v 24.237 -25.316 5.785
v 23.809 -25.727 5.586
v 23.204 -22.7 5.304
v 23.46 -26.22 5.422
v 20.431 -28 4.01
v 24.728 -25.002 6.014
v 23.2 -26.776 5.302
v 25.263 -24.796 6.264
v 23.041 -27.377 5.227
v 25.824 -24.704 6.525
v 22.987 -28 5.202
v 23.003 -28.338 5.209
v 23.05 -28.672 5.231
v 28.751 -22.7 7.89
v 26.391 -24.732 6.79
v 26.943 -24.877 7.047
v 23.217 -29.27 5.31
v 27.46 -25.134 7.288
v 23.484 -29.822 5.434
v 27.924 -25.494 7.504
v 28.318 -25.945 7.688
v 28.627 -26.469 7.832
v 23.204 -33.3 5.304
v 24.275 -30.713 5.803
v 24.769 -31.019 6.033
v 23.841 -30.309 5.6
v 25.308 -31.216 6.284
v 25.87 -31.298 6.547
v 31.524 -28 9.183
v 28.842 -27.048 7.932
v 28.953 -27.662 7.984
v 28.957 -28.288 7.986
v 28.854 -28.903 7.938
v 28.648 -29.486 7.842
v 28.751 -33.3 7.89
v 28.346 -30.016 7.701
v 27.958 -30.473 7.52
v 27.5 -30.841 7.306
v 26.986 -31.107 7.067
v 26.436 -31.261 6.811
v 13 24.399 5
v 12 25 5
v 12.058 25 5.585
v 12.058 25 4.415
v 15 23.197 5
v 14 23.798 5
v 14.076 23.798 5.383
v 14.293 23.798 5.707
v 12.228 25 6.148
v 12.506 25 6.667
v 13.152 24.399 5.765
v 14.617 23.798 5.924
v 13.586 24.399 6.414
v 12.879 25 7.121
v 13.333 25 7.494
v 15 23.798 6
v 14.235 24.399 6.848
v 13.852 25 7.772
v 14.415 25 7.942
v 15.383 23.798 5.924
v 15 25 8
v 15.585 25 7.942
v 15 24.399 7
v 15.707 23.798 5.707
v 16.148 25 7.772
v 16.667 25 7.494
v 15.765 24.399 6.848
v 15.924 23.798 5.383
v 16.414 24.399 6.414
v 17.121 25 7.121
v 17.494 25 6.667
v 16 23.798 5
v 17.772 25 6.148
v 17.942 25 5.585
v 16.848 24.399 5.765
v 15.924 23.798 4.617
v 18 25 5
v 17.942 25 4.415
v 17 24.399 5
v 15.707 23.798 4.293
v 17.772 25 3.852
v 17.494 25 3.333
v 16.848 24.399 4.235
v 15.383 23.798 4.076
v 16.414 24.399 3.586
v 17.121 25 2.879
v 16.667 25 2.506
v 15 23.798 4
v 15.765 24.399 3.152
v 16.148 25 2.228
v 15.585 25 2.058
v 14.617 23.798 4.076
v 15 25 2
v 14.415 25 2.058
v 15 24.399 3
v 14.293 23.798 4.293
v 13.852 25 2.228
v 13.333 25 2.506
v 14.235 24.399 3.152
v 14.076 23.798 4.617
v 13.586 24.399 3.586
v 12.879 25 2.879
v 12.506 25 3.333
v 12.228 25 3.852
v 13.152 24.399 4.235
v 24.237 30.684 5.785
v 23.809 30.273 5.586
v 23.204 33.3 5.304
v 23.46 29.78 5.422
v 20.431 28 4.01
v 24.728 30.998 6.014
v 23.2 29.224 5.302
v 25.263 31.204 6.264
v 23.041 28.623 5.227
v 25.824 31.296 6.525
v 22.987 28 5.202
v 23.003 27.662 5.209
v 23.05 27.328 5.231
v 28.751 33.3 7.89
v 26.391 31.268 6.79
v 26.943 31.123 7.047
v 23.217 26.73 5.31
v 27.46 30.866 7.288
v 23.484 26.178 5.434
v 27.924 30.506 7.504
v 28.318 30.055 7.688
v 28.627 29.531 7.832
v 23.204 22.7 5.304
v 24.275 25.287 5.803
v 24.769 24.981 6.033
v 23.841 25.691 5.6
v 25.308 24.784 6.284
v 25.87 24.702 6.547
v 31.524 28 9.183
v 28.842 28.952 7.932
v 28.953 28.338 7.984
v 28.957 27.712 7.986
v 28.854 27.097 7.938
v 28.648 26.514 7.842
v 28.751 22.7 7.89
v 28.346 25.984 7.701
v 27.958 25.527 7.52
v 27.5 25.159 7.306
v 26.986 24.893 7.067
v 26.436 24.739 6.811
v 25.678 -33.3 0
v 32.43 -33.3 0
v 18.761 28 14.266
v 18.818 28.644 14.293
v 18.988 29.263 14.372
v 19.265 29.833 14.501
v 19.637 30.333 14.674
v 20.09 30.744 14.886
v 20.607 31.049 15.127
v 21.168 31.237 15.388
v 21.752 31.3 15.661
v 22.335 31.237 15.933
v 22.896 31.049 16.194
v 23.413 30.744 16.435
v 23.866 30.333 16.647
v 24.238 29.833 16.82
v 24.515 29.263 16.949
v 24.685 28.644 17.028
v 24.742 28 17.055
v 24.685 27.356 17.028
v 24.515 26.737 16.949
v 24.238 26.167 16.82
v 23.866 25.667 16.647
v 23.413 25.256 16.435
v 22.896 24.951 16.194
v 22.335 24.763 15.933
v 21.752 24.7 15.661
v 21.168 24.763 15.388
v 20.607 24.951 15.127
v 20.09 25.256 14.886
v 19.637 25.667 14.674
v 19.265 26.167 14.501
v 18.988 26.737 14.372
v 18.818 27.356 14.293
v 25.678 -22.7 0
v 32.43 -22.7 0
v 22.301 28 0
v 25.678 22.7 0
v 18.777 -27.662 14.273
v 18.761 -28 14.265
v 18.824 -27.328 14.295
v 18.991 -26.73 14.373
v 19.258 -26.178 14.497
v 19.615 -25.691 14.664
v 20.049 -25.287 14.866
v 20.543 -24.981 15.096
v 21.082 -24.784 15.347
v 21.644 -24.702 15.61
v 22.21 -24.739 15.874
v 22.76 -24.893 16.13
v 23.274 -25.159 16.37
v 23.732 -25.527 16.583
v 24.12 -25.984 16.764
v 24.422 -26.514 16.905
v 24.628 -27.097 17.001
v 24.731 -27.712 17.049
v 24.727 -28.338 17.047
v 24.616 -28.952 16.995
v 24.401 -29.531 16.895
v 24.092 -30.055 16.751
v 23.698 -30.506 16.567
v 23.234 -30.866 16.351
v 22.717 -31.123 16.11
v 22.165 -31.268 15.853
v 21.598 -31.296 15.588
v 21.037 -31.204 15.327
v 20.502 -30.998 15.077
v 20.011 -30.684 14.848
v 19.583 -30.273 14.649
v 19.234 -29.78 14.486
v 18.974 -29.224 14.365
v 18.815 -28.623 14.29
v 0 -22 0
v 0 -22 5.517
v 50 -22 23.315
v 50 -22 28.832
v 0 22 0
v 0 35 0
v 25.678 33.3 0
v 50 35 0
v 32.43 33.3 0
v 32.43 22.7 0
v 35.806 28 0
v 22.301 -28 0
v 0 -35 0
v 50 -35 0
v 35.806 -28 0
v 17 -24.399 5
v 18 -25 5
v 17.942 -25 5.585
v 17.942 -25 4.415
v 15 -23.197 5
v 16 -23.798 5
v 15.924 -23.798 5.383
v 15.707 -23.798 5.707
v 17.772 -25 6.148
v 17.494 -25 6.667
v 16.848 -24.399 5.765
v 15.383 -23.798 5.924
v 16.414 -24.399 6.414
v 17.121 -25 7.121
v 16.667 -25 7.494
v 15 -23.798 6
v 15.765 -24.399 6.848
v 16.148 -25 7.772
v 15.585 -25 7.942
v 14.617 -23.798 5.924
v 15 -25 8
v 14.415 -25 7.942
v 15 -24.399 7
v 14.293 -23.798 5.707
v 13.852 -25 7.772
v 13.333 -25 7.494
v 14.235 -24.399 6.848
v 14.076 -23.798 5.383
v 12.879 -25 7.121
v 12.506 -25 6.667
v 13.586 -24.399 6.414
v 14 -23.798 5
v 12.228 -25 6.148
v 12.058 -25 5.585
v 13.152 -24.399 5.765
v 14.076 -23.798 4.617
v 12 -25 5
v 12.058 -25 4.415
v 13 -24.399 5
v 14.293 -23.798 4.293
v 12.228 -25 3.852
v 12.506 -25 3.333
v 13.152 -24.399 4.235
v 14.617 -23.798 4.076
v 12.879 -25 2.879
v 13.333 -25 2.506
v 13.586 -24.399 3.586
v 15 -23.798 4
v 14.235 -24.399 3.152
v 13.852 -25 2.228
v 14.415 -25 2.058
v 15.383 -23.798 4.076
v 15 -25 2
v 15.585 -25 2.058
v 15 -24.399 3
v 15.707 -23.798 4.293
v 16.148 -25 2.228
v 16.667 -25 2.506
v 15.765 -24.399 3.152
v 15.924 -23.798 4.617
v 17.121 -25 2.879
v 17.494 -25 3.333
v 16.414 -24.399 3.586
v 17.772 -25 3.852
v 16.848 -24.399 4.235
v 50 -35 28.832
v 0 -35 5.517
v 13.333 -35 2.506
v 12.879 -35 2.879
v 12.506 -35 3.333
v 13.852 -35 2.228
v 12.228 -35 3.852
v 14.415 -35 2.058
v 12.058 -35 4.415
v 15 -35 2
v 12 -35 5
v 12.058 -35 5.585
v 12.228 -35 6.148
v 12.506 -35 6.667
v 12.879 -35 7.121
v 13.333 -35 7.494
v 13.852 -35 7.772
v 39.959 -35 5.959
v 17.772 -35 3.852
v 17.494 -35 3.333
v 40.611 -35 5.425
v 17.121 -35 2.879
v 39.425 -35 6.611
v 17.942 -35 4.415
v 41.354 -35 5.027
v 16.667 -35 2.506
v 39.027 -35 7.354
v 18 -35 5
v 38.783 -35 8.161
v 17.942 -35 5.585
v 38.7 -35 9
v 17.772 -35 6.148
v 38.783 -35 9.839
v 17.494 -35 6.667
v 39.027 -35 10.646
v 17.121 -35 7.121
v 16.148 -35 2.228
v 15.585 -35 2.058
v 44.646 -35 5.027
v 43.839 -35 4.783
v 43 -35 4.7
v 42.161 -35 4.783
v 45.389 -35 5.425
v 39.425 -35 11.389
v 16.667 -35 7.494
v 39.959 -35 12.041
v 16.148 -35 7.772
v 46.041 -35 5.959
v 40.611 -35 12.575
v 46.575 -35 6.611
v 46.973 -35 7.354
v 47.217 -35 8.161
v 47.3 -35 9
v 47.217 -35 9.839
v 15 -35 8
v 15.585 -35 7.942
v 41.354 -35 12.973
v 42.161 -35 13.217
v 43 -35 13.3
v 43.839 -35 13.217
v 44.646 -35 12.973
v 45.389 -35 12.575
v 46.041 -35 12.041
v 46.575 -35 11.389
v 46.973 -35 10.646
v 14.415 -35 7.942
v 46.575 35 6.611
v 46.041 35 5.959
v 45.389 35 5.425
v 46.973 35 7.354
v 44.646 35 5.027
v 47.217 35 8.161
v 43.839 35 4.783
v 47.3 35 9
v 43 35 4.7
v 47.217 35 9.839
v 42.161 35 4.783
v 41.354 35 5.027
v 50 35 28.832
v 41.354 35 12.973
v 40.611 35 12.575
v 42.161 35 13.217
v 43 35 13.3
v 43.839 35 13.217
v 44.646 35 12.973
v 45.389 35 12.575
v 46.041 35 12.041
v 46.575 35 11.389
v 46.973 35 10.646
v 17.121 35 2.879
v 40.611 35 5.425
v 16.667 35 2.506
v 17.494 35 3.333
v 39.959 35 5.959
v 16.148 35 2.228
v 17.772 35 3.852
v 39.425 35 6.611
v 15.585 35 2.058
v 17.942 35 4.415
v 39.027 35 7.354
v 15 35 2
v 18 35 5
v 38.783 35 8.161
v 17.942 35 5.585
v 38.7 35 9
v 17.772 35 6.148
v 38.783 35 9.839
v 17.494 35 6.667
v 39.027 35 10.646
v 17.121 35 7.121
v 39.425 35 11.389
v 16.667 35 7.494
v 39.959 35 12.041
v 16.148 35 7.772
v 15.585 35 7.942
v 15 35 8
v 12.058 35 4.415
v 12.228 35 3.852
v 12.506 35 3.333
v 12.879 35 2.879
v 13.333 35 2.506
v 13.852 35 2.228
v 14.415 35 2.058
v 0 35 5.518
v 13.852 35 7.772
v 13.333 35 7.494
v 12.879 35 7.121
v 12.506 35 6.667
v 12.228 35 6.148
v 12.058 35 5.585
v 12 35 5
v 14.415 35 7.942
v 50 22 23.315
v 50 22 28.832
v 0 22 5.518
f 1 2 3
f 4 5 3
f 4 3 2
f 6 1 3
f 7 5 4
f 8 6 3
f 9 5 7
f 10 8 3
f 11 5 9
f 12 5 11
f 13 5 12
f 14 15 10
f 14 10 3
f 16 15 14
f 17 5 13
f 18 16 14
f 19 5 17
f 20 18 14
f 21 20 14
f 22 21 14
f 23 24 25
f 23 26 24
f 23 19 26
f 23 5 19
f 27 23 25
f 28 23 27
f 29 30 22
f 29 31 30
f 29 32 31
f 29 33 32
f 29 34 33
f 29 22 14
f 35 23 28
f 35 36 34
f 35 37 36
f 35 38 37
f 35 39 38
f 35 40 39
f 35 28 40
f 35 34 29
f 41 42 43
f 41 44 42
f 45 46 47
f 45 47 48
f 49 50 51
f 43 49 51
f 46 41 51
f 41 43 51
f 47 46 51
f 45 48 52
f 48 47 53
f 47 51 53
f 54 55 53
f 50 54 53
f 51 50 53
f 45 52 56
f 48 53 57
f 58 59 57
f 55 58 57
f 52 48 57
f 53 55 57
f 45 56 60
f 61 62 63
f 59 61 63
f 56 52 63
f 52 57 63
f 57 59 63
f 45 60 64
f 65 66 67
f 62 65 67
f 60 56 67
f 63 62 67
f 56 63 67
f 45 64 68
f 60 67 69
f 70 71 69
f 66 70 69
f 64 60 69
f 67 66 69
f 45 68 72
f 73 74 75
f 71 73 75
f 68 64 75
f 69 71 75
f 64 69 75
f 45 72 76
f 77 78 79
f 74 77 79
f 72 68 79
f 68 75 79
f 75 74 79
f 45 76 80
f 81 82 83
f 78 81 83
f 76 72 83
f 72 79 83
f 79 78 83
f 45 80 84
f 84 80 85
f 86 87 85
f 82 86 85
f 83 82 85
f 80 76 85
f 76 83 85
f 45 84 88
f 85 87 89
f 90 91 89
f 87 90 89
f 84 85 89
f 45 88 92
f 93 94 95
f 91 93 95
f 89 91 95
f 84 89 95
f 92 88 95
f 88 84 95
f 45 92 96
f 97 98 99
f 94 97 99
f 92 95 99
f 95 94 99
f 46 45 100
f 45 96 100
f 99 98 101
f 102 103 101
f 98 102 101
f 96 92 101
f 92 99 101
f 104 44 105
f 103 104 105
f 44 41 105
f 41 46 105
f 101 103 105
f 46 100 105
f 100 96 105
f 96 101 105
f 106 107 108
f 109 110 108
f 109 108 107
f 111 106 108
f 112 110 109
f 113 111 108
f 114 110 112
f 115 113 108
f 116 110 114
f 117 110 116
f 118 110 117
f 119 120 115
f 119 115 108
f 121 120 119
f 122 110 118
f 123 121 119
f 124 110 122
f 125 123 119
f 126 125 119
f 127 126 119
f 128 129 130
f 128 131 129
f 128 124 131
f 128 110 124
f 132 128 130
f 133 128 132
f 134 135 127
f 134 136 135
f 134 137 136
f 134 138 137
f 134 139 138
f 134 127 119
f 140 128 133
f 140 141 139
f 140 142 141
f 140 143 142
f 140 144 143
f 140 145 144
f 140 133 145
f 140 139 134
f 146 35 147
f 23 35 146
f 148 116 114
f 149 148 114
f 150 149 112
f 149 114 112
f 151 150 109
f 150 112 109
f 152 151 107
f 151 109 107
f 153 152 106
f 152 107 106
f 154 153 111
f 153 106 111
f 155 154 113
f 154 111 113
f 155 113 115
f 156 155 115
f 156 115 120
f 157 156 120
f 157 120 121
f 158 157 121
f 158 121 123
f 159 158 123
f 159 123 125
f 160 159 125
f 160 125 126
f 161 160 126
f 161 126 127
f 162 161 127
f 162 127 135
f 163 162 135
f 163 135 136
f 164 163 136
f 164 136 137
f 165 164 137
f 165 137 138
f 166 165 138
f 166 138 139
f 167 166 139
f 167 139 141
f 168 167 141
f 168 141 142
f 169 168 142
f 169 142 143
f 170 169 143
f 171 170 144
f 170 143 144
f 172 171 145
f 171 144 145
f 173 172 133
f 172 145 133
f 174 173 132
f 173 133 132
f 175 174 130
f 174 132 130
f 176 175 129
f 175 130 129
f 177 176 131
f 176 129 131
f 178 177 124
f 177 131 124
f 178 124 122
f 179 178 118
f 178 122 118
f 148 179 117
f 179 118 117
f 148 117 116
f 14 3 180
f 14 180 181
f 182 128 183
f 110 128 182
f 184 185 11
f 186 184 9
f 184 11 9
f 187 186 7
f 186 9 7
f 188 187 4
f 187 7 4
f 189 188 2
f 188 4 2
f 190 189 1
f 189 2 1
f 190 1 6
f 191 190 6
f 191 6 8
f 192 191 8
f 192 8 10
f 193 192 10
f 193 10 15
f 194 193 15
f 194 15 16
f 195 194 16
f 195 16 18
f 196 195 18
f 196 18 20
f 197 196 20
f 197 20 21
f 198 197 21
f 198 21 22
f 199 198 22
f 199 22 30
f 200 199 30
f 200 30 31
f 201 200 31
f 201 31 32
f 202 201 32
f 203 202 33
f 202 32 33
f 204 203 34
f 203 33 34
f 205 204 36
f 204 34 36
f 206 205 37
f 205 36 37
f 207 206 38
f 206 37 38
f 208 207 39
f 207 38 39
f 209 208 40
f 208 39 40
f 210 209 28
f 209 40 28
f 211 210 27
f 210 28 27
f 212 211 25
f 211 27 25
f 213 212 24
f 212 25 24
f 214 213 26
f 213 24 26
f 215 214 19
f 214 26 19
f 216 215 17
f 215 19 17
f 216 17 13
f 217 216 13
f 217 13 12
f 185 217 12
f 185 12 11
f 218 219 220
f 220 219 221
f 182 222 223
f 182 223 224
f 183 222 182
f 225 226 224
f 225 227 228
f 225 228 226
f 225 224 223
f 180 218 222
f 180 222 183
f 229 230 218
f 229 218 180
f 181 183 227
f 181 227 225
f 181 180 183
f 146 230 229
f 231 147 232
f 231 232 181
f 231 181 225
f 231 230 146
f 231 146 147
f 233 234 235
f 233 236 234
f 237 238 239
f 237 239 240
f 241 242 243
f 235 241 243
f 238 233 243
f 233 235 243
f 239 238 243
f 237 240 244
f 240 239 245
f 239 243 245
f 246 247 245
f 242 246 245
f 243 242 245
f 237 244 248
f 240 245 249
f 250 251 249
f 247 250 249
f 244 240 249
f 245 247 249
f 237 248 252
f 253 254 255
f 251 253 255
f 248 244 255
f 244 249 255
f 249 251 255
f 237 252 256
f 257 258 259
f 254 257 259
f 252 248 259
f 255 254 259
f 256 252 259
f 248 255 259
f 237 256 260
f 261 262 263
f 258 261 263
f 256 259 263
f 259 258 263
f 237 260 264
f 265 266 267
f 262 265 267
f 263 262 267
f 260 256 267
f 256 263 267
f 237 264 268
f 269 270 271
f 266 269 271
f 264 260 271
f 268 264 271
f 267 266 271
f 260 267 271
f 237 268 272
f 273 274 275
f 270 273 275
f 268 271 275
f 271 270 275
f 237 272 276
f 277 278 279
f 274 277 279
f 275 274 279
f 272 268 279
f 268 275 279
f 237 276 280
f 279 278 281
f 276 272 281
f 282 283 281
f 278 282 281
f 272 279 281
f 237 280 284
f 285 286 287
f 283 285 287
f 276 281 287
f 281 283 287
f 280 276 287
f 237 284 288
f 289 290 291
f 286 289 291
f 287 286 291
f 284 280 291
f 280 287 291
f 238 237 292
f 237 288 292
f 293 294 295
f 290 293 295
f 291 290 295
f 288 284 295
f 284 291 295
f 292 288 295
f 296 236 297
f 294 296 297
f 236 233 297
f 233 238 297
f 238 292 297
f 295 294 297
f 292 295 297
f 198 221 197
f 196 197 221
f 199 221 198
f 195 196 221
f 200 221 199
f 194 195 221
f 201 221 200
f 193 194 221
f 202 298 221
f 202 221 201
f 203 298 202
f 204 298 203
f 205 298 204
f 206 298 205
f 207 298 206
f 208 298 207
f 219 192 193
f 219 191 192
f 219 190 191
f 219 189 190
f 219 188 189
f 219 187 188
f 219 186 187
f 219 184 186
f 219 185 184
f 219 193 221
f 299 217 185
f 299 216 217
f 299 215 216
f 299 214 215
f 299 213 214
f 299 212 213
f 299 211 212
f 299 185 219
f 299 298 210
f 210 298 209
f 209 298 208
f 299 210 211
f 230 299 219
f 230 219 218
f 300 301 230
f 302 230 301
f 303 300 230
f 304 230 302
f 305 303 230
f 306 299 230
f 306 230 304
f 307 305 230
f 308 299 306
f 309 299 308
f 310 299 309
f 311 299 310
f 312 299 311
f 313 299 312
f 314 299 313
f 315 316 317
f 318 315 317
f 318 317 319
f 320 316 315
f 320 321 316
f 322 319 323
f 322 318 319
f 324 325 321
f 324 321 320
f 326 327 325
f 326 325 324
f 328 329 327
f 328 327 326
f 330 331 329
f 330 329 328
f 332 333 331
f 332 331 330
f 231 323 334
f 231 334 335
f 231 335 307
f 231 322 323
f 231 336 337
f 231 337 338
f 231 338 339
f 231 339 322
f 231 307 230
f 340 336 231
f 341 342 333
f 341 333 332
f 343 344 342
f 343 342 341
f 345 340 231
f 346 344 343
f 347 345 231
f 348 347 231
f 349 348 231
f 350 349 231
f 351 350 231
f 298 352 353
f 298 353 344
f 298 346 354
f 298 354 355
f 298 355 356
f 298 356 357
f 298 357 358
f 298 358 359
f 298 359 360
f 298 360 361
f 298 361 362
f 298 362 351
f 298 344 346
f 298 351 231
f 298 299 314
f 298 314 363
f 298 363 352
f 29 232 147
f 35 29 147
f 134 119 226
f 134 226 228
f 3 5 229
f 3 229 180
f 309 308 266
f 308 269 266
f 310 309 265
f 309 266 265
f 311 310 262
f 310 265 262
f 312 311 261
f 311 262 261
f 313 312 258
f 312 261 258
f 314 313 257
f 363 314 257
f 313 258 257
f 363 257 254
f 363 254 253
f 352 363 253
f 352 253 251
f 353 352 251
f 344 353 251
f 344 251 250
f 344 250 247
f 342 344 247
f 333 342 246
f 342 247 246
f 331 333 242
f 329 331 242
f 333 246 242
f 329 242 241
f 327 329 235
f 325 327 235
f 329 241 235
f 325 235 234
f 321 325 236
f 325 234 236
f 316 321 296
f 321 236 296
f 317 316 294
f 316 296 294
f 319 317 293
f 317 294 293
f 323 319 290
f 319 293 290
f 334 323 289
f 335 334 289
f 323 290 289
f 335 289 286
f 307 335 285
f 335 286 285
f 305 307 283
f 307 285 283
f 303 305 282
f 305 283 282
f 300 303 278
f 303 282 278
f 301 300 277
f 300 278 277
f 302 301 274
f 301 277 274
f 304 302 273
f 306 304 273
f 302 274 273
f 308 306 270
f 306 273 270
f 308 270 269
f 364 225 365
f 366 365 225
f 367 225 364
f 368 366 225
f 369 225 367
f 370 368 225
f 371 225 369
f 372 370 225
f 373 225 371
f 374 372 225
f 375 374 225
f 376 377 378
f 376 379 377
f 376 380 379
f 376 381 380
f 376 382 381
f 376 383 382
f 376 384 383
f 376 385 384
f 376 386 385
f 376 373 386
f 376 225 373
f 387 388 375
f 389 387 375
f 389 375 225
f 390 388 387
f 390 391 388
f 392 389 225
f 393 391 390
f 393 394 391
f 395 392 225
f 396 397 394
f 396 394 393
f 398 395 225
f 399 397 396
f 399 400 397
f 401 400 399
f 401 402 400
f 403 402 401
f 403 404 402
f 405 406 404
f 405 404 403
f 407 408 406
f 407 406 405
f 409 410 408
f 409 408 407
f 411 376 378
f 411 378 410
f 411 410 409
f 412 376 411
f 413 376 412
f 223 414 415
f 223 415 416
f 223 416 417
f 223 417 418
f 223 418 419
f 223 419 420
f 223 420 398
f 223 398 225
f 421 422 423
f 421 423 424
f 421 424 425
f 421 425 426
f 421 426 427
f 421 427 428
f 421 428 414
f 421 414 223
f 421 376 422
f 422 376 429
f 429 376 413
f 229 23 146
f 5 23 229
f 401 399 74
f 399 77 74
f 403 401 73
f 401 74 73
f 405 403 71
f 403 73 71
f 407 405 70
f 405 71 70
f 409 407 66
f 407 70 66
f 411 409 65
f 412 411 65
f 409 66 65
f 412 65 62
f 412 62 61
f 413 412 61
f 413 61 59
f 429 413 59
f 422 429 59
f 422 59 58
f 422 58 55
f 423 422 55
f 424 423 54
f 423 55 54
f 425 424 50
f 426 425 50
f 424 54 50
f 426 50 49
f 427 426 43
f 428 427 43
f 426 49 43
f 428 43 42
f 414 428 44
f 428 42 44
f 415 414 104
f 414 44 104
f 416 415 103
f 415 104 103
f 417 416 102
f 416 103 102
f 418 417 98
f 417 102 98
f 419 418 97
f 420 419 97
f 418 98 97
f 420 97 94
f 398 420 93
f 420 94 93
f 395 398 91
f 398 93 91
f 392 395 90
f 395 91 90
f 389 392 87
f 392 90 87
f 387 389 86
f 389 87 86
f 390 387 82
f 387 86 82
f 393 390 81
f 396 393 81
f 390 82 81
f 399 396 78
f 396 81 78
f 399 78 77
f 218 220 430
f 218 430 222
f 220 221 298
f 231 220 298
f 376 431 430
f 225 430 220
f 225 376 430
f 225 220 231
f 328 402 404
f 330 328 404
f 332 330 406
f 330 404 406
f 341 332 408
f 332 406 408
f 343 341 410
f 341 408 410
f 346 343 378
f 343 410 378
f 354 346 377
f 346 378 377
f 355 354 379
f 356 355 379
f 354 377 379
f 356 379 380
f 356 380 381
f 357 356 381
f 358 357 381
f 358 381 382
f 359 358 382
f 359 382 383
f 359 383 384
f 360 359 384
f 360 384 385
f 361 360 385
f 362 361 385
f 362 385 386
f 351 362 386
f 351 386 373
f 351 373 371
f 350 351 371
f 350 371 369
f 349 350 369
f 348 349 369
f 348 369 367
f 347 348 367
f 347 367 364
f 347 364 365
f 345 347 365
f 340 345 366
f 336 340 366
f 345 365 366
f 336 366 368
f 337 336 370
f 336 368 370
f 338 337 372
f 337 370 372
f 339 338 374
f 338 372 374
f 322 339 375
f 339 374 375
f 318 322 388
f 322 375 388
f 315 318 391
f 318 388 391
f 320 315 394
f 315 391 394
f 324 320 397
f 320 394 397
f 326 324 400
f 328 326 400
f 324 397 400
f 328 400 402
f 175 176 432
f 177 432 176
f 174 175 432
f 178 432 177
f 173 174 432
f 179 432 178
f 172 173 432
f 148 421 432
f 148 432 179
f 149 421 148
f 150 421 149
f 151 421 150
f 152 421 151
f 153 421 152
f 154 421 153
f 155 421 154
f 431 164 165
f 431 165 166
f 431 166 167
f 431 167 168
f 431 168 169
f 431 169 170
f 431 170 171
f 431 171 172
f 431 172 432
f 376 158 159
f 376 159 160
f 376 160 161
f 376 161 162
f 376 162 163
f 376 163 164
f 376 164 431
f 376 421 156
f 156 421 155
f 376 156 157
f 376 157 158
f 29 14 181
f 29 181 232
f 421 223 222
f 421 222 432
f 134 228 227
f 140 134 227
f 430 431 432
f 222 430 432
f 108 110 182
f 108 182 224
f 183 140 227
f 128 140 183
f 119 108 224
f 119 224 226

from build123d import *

# Parameters (mm, degrees)
F1_DEPTH  = 35
F5_DEPTH  = 13
F7_DEPTH  = 13
F9_D      = 6.6
F12_DEPTH = 15
F14_D     = 8.6
F17_D     = 6
F17_DEPTH = 10
F17_TIP   = 1.8025818571
F19_D     = 6
F19_DEPTH = 10
F19_TIP   = 1.8025818571


with BuildPart() as f1:
    # F0 (on Front) → F1 (new body, symmetric)
    with BuildSketch(Plane.XZ):
        Polygon((50, 23.3153829077), (0, 0), (50, 0), align=None)
    extrude(amount=F1_DEPTH, both=True)

    # F4 (on face) → F5 (join)
    with BuildSketch(Plane.XZ.offset(35)):
        Polygon((0, 5.5168895948), (0, 0), (50, 23.3153829077), (50, 28.8322725026), align=None)
    extrude(amount=-F5_DEPTH)

    # F6 (on face) → F7 (join)
    with BuildSketch(Plane(origin=(0, 35, 0), x_dir=(-1, 0, 0), z_dir=(0, 1, 0))):
        Polygon((-50, 28.832308948), (-50, 23.3153829077), (0, 0), (0, 5.5180899799), align=None)
    extrude(amount=-F7_DEPTH)

    # F9 (through all)
    with Locations(Plane(origin=(-2.1134832591, 0, 4.5326057501), x_dir=(0.9063158679, 0, 0.4226009319), z_dir=(-0.4226009319, 0, 0.9063158679))):
        with Locations((26.3319499681, 28), (26.3319499681, -28)):
            Hole(F9_D / 2)

    # F11 (on offset) → F12 (cut)
    with BuildSketch(Plane(origin=(2.1130913087, 0, -4.5315389352), x_dir=(0.906307787, 0, 0.4226182617), z_dir=(0.4226182617, 0, -0.906307787))):
        Polygon((20.2118023361, -28), (23.2717587628, -33.3), (29.3916716162, -33.3), (32.4516280429, -28), (29.3916716162, -22.7), (23.2717587628, -22.7), align=None)
        Polygon((20.2118023361, 28), (23.2717587628, 22.7), (29.3916716162, 22.7), (32.4516280429, 28), (29.3916716162, 33.3), (23.2717587628, 33.3), align=None)
    extrude(amount=F12_DEPTH, mode=Mode.SUBTRACT)

    # F14 (through all)
    with Locations(Plane.XZ.offset(35)):
        with Locations((43, 9)):
            Hole(F14_D / 2)

    # F17
    with Locations(Plane.XZ.offset(35)):
        with Locations((15, 5)):
            Hole(F17_D / 2, depth=F17_DEPTH)
            with Locations((0, 0, -(F17_DEPTH + F17_TIP / 2))):  # 118° drill point
                Cone(0, F17_D / 2, F17_TIP, mode=Mode.SUBTRACT)

    # F19
    with Locations(Plane(origin=(0, 35, 0), x_dir=(-1, 0, 0), z_dir=(0, 1, 0))):
        with Locations((-15, 5)):
            Hole(F19_D / 2, depth=F19_DEPTH)
            with Locations((0, 0, -(F19_DEPTH + F19_TIP / 2))):  # 118° drill point
                Cone(0, F19_D / 2, F19_TIP, mode=Mode.SUBTRACT)


solid = f1.part
